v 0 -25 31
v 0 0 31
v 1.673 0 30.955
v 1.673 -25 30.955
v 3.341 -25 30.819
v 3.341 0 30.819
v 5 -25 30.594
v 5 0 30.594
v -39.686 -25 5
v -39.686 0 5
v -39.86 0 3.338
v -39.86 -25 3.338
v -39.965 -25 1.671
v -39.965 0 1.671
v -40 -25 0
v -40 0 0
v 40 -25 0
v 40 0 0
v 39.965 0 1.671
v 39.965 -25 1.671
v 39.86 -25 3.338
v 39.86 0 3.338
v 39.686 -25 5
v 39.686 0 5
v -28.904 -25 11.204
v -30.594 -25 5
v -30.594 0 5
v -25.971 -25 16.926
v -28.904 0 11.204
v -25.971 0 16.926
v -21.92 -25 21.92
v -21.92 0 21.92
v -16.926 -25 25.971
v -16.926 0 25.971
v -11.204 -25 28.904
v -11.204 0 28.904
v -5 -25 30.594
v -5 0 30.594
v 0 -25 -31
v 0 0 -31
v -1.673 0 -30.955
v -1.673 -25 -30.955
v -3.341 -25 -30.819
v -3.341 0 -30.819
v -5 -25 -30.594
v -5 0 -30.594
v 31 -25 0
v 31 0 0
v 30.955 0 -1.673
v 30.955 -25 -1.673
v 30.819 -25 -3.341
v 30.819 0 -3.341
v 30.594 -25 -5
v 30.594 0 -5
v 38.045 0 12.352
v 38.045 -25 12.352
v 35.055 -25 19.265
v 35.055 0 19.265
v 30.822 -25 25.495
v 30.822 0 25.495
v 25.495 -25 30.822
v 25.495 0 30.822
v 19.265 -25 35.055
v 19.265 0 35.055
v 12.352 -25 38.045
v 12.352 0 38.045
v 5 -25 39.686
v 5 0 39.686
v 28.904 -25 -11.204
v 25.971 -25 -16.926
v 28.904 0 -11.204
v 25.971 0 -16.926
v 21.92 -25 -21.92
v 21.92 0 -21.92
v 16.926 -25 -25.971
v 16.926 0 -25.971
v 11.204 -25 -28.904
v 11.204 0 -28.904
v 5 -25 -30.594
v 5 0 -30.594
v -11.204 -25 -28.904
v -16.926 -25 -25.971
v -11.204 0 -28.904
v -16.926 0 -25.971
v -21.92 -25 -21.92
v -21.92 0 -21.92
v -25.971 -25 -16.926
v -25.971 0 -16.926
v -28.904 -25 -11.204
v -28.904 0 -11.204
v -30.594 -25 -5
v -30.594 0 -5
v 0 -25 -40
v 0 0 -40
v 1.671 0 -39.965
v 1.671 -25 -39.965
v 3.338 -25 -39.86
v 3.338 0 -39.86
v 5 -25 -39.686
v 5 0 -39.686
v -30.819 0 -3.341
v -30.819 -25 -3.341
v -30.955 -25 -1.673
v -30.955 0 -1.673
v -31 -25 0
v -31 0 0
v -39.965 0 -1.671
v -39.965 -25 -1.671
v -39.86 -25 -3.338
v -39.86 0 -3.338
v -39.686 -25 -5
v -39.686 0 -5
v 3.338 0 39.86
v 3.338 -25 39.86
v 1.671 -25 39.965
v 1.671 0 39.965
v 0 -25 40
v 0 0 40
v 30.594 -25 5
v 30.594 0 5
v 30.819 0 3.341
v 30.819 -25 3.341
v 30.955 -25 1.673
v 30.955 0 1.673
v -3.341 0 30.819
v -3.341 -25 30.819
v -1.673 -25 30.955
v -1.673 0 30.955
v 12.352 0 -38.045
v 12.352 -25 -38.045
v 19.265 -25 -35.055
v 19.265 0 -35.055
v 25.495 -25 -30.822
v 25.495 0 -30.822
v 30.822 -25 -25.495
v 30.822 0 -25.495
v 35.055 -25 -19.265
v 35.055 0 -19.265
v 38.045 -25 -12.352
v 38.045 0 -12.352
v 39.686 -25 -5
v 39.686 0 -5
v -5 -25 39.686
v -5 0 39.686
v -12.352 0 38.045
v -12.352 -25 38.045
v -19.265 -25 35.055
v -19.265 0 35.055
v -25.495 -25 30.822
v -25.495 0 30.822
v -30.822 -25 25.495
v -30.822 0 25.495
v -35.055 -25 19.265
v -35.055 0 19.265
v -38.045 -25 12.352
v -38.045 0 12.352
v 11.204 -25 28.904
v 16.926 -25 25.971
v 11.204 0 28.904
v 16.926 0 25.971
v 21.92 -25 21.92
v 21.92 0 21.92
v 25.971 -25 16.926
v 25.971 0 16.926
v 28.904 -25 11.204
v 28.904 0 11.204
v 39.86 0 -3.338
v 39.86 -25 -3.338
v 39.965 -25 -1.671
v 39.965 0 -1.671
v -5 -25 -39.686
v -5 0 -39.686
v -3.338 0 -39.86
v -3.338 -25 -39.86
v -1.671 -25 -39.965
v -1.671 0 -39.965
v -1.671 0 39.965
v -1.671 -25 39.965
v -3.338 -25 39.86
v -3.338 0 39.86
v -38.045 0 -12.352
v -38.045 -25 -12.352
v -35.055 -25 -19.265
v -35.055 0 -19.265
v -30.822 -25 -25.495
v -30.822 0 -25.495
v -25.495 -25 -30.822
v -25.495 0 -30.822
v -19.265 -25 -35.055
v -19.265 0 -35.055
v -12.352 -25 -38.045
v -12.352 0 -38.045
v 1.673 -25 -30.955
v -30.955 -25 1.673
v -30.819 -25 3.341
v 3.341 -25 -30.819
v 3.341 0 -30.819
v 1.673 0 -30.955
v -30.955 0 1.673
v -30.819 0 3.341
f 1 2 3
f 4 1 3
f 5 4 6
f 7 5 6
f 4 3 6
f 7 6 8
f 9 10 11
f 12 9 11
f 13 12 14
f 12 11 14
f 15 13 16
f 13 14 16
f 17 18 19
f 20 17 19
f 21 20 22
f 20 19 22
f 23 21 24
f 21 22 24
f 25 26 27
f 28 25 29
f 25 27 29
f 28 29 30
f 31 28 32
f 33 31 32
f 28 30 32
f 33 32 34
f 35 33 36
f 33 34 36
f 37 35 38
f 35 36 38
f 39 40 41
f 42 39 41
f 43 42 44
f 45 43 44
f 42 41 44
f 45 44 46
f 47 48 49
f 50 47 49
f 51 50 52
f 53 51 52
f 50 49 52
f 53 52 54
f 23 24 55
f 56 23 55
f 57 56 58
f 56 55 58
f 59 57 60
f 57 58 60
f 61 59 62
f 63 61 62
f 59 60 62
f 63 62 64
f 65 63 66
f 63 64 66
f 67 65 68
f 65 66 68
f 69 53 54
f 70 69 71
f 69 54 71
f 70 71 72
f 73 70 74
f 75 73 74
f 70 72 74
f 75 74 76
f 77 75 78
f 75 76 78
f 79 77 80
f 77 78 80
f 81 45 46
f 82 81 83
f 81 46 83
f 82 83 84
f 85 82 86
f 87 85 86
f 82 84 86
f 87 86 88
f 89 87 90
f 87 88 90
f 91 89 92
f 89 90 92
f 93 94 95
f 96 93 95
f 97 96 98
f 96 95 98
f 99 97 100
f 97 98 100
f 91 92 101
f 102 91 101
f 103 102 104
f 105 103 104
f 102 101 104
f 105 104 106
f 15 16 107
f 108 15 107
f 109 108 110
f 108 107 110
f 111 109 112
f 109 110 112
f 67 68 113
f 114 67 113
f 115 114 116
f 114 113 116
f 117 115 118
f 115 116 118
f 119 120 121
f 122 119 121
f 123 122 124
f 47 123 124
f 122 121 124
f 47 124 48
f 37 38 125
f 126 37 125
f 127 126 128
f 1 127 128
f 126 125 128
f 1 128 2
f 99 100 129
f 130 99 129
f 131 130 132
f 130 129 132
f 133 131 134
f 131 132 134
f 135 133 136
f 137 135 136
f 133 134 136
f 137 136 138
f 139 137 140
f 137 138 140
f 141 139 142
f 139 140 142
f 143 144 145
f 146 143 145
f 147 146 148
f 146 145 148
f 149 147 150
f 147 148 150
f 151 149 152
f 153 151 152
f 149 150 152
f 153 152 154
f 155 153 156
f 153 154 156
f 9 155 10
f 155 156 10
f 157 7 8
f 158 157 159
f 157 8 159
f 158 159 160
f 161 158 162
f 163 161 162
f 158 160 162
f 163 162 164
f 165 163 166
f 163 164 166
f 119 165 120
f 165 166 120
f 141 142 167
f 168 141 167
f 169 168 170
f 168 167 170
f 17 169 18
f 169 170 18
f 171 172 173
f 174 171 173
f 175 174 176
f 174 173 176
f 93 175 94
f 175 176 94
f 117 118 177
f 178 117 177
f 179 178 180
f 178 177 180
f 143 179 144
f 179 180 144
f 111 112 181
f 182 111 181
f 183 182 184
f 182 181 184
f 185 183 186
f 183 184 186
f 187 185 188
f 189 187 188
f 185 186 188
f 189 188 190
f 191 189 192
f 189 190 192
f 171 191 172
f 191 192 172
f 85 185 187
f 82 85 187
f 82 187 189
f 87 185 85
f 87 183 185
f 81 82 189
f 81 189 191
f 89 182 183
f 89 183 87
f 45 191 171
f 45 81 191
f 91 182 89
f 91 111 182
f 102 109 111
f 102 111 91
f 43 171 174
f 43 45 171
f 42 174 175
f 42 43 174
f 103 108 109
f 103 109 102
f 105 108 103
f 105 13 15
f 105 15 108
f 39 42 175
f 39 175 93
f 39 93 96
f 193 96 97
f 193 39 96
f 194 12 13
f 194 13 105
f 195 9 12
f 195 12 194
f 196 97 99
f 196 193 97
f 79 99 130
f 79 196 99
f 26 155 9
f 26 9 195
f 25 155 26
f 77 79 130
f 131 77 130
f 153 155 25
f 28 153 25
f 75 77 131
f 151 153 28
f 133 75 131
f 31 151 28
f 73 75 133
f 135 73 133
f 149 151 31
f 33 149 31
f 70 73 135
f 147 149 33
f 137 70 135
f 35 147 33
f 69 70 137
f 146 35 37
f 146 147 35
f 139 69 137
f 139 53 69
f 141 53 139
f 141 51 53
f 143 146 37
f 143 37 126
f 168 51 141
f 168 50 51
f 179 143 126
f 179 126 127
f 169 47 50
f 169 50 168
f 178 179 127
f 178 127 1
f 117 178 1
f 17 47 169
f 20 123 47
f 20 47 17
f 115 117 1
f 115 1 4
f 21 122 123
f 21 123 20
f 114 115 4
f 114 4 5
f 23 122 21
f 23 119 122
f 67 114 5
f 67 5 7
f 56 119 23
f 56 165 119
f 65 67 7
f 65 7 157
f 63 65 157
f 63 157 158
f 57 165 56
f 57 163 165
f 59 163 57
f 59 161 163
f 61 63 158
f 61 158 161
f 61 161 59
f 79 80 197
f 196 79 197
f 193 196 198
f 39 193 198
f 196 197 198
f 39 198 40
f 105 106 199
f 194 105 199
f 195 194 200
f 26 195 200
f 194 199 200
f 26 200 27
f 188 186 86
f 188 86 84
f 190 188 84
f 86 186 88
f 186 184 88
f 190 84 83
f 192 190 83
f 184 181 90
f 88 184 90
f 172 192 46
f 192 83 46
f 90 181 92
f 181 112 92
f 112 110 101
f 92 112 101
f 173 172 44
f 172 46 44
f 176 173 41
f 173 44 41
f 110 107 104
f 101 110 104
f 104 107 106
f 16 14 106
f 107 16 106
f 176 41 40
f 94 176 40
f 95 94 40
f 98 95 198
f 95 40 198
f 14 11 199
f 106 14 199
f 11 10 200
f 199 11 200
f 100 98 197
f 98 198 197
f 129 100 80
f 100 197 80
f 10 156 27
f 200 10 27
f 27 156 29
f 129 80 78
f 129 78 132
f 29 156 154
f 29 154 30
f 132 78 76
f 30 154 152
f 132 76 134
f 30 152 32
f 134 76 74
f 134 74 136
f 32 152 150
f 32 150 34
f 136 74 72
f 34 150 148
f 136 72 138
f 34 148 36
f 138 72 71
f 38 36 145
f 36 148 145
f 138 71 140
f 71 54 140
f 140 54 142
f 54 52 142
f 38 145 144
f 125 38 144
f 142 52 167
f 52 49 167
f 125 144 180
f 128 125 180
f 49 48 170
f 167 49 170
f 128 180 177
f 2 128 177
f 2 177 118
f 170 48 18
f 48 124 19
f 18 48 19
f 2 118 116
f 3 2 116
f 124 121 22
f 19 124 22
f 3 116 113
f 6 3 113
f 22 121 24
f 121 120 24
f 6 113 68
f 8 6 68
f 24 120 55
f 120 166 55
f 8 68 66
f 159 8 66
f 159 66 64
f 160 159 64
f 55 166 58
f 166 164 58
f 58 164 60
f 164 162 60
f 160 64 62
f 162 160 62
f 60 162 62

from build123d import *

# Parameters (mm, degrees)
F1_DEPTH = 25


with BuildPart() as f1:
    # F0 (on Front) → F1 (new body)
    with BuildSketch(Plane.XZ):
        with BuildLine():
            Line((5, 30.5941170816), (5, 39.686269666))
            ThreePointArc((5, 39.686269666), (2.5049165017, 39.9214903695), (0, 40))
            Line((0, 40), (0, 31))
            ThreePointArc((0, 31), (2.5082235219, 30.8983626551), (5, 30.5941170816))
        make_face()
        with BuildLine():
            Line((0, 31), (0, 40))
            ThreePointArc((0, 40), (-2.5049165017, 39.9214903695), (-5, 39.686269666))
            Line((-5, 39.686269666), (-5, 30.5941170816))
            ThreePointArc((-5, 30.5941170816), (-2.5082235219, 30.8983626551), (0, 31))
        make_face()
        with BuildLine():
            Line((-5, 30.5941170816), (-5, 39.686269666))
            ThreePointArc((-5, 39.686269666), (-28.2842712475, 28.2842712475), (-39.686269666, 5))
            Line((-39.686269666, 5), (-30.5941170816, 5))
            ThreePointArc((-30.5941170816, 5), (-21.9203102168, 21.9203102168), (-5, 30.5941170816))
        make_face()
        with BuildLine():
            Line((-30.5941170816, 5), (-39.686269666, 5))
            ThreePointArc((-39.686269666, 5), (-39.9214903695, 2.5049165017), (-40, 0))
            Line((-40, 0), (-31, 0))
            ThreePointArc((-31, 0), (-30.8983626551, 2.5082235219), (-30.5941170816, 5))
        make_face()
        with BuildLine():
            ThreePointArc((-40, 0), (-39.9214903695, -2.5049165017), (-39.686269666, -5))
            Line((-39.686269666, -5), (-30.5941170816, -5))
            ThreePointArc((-30.5941170816, -5), (-30.8983626551, -2.5082235219), (-31, 0))
            Line((-31, 0), (-40, 0))
        make_face()
        with BuildLine():
            ThreePointArc((-39.686269666, -5), (-28.2842712475, -28.2842712475), (-5, -39.686269666))
            Line((-5, -39.686269666), (-5, -30.5941170816))
            ThreePointArc((-5, -30.5941170816), (-21.9203102168, -21.9203102168), (-30.5941170816, -5))
            Line((-30.5941170816, -5), (-39.686269666, -5))
        make_face()
        with BuildLine():
            ThreePointArc((-5, -39.686269666), (-2.5049165017, -39.9214903695), (0, -40))
            Line((0, -40), (0, -31))
            ThreePointArc((0, -31), (-2.5082235219, -30.8983626551), (-5, -30.5941170816))
            Line((-5, -30.5941170816), (-5, -39.686269666))
        make_face()
        with BuildLine():
            ThreePointArc((0, -40), (2.5049165017, -39.9214903695), (5, -39.686269666))
            Line((5, -39.686269666), (5, -30.5941170816))
            ThreePointArc((5, -30.5941170816), (2.5082235219, -30.8983626551), (0, -31))
            Line((0, -31), (0, -40))
        make_face()
        with BuildLine():
            ThreePointArc((5, -39.686269666), (28.2842712475, -28.2842712475), (39.686269666, -5))
            Line((39.686269666, -5), (30.5941170816, -5))
            ThreePointArc((30.5941170816, -5), (21.9203102168, -21.9203102168), (5, -30.5941170816))
            Line((5, -30.5941170816), (5, -39.686269666))
        make_face()
        with BuildLine():
            ThreePointArc((39.686269666, -5), (39.9214903695, -2.5049165017), (40, 0))
            Line((40, 0), (31, 0))
            ThreePointArc((31, 0), (30.8983626551, -2.5082235219), (30.5941170816, -5))
            Line((30.5941170816, -5), (39.686269666, -5))
        make_face()
        with BuildLine():
            Line((31, 0), (40, 0))
            ThreePointArc((40, 0), (39.9214903695, 2.5049165017), (39.686269666, 5))
            Line((39.686269666, 5), (30.5941170816, 5))
            ThreePointArc((30.5941170816, 5), (30.8983626551, 2.5082235219), (31, 0))
        make_face()
        with BuildLine():
            Line((30.5941170816, 5), (39.686269666, 5))
            ThreePointArc((39.686269666, 5), (28.2842712475, 28.2842712475), (5, 39.686269666))
            Line((5, 39.686269666), (5, 30.5941170816))
            ThreePointArc((5, 30.5941170816), (21.9203102168, 21.9203102168), (30.5941170816, 5))
        make_face()
    extrude(amount=F1_DEPTH)


solid = f1.part
